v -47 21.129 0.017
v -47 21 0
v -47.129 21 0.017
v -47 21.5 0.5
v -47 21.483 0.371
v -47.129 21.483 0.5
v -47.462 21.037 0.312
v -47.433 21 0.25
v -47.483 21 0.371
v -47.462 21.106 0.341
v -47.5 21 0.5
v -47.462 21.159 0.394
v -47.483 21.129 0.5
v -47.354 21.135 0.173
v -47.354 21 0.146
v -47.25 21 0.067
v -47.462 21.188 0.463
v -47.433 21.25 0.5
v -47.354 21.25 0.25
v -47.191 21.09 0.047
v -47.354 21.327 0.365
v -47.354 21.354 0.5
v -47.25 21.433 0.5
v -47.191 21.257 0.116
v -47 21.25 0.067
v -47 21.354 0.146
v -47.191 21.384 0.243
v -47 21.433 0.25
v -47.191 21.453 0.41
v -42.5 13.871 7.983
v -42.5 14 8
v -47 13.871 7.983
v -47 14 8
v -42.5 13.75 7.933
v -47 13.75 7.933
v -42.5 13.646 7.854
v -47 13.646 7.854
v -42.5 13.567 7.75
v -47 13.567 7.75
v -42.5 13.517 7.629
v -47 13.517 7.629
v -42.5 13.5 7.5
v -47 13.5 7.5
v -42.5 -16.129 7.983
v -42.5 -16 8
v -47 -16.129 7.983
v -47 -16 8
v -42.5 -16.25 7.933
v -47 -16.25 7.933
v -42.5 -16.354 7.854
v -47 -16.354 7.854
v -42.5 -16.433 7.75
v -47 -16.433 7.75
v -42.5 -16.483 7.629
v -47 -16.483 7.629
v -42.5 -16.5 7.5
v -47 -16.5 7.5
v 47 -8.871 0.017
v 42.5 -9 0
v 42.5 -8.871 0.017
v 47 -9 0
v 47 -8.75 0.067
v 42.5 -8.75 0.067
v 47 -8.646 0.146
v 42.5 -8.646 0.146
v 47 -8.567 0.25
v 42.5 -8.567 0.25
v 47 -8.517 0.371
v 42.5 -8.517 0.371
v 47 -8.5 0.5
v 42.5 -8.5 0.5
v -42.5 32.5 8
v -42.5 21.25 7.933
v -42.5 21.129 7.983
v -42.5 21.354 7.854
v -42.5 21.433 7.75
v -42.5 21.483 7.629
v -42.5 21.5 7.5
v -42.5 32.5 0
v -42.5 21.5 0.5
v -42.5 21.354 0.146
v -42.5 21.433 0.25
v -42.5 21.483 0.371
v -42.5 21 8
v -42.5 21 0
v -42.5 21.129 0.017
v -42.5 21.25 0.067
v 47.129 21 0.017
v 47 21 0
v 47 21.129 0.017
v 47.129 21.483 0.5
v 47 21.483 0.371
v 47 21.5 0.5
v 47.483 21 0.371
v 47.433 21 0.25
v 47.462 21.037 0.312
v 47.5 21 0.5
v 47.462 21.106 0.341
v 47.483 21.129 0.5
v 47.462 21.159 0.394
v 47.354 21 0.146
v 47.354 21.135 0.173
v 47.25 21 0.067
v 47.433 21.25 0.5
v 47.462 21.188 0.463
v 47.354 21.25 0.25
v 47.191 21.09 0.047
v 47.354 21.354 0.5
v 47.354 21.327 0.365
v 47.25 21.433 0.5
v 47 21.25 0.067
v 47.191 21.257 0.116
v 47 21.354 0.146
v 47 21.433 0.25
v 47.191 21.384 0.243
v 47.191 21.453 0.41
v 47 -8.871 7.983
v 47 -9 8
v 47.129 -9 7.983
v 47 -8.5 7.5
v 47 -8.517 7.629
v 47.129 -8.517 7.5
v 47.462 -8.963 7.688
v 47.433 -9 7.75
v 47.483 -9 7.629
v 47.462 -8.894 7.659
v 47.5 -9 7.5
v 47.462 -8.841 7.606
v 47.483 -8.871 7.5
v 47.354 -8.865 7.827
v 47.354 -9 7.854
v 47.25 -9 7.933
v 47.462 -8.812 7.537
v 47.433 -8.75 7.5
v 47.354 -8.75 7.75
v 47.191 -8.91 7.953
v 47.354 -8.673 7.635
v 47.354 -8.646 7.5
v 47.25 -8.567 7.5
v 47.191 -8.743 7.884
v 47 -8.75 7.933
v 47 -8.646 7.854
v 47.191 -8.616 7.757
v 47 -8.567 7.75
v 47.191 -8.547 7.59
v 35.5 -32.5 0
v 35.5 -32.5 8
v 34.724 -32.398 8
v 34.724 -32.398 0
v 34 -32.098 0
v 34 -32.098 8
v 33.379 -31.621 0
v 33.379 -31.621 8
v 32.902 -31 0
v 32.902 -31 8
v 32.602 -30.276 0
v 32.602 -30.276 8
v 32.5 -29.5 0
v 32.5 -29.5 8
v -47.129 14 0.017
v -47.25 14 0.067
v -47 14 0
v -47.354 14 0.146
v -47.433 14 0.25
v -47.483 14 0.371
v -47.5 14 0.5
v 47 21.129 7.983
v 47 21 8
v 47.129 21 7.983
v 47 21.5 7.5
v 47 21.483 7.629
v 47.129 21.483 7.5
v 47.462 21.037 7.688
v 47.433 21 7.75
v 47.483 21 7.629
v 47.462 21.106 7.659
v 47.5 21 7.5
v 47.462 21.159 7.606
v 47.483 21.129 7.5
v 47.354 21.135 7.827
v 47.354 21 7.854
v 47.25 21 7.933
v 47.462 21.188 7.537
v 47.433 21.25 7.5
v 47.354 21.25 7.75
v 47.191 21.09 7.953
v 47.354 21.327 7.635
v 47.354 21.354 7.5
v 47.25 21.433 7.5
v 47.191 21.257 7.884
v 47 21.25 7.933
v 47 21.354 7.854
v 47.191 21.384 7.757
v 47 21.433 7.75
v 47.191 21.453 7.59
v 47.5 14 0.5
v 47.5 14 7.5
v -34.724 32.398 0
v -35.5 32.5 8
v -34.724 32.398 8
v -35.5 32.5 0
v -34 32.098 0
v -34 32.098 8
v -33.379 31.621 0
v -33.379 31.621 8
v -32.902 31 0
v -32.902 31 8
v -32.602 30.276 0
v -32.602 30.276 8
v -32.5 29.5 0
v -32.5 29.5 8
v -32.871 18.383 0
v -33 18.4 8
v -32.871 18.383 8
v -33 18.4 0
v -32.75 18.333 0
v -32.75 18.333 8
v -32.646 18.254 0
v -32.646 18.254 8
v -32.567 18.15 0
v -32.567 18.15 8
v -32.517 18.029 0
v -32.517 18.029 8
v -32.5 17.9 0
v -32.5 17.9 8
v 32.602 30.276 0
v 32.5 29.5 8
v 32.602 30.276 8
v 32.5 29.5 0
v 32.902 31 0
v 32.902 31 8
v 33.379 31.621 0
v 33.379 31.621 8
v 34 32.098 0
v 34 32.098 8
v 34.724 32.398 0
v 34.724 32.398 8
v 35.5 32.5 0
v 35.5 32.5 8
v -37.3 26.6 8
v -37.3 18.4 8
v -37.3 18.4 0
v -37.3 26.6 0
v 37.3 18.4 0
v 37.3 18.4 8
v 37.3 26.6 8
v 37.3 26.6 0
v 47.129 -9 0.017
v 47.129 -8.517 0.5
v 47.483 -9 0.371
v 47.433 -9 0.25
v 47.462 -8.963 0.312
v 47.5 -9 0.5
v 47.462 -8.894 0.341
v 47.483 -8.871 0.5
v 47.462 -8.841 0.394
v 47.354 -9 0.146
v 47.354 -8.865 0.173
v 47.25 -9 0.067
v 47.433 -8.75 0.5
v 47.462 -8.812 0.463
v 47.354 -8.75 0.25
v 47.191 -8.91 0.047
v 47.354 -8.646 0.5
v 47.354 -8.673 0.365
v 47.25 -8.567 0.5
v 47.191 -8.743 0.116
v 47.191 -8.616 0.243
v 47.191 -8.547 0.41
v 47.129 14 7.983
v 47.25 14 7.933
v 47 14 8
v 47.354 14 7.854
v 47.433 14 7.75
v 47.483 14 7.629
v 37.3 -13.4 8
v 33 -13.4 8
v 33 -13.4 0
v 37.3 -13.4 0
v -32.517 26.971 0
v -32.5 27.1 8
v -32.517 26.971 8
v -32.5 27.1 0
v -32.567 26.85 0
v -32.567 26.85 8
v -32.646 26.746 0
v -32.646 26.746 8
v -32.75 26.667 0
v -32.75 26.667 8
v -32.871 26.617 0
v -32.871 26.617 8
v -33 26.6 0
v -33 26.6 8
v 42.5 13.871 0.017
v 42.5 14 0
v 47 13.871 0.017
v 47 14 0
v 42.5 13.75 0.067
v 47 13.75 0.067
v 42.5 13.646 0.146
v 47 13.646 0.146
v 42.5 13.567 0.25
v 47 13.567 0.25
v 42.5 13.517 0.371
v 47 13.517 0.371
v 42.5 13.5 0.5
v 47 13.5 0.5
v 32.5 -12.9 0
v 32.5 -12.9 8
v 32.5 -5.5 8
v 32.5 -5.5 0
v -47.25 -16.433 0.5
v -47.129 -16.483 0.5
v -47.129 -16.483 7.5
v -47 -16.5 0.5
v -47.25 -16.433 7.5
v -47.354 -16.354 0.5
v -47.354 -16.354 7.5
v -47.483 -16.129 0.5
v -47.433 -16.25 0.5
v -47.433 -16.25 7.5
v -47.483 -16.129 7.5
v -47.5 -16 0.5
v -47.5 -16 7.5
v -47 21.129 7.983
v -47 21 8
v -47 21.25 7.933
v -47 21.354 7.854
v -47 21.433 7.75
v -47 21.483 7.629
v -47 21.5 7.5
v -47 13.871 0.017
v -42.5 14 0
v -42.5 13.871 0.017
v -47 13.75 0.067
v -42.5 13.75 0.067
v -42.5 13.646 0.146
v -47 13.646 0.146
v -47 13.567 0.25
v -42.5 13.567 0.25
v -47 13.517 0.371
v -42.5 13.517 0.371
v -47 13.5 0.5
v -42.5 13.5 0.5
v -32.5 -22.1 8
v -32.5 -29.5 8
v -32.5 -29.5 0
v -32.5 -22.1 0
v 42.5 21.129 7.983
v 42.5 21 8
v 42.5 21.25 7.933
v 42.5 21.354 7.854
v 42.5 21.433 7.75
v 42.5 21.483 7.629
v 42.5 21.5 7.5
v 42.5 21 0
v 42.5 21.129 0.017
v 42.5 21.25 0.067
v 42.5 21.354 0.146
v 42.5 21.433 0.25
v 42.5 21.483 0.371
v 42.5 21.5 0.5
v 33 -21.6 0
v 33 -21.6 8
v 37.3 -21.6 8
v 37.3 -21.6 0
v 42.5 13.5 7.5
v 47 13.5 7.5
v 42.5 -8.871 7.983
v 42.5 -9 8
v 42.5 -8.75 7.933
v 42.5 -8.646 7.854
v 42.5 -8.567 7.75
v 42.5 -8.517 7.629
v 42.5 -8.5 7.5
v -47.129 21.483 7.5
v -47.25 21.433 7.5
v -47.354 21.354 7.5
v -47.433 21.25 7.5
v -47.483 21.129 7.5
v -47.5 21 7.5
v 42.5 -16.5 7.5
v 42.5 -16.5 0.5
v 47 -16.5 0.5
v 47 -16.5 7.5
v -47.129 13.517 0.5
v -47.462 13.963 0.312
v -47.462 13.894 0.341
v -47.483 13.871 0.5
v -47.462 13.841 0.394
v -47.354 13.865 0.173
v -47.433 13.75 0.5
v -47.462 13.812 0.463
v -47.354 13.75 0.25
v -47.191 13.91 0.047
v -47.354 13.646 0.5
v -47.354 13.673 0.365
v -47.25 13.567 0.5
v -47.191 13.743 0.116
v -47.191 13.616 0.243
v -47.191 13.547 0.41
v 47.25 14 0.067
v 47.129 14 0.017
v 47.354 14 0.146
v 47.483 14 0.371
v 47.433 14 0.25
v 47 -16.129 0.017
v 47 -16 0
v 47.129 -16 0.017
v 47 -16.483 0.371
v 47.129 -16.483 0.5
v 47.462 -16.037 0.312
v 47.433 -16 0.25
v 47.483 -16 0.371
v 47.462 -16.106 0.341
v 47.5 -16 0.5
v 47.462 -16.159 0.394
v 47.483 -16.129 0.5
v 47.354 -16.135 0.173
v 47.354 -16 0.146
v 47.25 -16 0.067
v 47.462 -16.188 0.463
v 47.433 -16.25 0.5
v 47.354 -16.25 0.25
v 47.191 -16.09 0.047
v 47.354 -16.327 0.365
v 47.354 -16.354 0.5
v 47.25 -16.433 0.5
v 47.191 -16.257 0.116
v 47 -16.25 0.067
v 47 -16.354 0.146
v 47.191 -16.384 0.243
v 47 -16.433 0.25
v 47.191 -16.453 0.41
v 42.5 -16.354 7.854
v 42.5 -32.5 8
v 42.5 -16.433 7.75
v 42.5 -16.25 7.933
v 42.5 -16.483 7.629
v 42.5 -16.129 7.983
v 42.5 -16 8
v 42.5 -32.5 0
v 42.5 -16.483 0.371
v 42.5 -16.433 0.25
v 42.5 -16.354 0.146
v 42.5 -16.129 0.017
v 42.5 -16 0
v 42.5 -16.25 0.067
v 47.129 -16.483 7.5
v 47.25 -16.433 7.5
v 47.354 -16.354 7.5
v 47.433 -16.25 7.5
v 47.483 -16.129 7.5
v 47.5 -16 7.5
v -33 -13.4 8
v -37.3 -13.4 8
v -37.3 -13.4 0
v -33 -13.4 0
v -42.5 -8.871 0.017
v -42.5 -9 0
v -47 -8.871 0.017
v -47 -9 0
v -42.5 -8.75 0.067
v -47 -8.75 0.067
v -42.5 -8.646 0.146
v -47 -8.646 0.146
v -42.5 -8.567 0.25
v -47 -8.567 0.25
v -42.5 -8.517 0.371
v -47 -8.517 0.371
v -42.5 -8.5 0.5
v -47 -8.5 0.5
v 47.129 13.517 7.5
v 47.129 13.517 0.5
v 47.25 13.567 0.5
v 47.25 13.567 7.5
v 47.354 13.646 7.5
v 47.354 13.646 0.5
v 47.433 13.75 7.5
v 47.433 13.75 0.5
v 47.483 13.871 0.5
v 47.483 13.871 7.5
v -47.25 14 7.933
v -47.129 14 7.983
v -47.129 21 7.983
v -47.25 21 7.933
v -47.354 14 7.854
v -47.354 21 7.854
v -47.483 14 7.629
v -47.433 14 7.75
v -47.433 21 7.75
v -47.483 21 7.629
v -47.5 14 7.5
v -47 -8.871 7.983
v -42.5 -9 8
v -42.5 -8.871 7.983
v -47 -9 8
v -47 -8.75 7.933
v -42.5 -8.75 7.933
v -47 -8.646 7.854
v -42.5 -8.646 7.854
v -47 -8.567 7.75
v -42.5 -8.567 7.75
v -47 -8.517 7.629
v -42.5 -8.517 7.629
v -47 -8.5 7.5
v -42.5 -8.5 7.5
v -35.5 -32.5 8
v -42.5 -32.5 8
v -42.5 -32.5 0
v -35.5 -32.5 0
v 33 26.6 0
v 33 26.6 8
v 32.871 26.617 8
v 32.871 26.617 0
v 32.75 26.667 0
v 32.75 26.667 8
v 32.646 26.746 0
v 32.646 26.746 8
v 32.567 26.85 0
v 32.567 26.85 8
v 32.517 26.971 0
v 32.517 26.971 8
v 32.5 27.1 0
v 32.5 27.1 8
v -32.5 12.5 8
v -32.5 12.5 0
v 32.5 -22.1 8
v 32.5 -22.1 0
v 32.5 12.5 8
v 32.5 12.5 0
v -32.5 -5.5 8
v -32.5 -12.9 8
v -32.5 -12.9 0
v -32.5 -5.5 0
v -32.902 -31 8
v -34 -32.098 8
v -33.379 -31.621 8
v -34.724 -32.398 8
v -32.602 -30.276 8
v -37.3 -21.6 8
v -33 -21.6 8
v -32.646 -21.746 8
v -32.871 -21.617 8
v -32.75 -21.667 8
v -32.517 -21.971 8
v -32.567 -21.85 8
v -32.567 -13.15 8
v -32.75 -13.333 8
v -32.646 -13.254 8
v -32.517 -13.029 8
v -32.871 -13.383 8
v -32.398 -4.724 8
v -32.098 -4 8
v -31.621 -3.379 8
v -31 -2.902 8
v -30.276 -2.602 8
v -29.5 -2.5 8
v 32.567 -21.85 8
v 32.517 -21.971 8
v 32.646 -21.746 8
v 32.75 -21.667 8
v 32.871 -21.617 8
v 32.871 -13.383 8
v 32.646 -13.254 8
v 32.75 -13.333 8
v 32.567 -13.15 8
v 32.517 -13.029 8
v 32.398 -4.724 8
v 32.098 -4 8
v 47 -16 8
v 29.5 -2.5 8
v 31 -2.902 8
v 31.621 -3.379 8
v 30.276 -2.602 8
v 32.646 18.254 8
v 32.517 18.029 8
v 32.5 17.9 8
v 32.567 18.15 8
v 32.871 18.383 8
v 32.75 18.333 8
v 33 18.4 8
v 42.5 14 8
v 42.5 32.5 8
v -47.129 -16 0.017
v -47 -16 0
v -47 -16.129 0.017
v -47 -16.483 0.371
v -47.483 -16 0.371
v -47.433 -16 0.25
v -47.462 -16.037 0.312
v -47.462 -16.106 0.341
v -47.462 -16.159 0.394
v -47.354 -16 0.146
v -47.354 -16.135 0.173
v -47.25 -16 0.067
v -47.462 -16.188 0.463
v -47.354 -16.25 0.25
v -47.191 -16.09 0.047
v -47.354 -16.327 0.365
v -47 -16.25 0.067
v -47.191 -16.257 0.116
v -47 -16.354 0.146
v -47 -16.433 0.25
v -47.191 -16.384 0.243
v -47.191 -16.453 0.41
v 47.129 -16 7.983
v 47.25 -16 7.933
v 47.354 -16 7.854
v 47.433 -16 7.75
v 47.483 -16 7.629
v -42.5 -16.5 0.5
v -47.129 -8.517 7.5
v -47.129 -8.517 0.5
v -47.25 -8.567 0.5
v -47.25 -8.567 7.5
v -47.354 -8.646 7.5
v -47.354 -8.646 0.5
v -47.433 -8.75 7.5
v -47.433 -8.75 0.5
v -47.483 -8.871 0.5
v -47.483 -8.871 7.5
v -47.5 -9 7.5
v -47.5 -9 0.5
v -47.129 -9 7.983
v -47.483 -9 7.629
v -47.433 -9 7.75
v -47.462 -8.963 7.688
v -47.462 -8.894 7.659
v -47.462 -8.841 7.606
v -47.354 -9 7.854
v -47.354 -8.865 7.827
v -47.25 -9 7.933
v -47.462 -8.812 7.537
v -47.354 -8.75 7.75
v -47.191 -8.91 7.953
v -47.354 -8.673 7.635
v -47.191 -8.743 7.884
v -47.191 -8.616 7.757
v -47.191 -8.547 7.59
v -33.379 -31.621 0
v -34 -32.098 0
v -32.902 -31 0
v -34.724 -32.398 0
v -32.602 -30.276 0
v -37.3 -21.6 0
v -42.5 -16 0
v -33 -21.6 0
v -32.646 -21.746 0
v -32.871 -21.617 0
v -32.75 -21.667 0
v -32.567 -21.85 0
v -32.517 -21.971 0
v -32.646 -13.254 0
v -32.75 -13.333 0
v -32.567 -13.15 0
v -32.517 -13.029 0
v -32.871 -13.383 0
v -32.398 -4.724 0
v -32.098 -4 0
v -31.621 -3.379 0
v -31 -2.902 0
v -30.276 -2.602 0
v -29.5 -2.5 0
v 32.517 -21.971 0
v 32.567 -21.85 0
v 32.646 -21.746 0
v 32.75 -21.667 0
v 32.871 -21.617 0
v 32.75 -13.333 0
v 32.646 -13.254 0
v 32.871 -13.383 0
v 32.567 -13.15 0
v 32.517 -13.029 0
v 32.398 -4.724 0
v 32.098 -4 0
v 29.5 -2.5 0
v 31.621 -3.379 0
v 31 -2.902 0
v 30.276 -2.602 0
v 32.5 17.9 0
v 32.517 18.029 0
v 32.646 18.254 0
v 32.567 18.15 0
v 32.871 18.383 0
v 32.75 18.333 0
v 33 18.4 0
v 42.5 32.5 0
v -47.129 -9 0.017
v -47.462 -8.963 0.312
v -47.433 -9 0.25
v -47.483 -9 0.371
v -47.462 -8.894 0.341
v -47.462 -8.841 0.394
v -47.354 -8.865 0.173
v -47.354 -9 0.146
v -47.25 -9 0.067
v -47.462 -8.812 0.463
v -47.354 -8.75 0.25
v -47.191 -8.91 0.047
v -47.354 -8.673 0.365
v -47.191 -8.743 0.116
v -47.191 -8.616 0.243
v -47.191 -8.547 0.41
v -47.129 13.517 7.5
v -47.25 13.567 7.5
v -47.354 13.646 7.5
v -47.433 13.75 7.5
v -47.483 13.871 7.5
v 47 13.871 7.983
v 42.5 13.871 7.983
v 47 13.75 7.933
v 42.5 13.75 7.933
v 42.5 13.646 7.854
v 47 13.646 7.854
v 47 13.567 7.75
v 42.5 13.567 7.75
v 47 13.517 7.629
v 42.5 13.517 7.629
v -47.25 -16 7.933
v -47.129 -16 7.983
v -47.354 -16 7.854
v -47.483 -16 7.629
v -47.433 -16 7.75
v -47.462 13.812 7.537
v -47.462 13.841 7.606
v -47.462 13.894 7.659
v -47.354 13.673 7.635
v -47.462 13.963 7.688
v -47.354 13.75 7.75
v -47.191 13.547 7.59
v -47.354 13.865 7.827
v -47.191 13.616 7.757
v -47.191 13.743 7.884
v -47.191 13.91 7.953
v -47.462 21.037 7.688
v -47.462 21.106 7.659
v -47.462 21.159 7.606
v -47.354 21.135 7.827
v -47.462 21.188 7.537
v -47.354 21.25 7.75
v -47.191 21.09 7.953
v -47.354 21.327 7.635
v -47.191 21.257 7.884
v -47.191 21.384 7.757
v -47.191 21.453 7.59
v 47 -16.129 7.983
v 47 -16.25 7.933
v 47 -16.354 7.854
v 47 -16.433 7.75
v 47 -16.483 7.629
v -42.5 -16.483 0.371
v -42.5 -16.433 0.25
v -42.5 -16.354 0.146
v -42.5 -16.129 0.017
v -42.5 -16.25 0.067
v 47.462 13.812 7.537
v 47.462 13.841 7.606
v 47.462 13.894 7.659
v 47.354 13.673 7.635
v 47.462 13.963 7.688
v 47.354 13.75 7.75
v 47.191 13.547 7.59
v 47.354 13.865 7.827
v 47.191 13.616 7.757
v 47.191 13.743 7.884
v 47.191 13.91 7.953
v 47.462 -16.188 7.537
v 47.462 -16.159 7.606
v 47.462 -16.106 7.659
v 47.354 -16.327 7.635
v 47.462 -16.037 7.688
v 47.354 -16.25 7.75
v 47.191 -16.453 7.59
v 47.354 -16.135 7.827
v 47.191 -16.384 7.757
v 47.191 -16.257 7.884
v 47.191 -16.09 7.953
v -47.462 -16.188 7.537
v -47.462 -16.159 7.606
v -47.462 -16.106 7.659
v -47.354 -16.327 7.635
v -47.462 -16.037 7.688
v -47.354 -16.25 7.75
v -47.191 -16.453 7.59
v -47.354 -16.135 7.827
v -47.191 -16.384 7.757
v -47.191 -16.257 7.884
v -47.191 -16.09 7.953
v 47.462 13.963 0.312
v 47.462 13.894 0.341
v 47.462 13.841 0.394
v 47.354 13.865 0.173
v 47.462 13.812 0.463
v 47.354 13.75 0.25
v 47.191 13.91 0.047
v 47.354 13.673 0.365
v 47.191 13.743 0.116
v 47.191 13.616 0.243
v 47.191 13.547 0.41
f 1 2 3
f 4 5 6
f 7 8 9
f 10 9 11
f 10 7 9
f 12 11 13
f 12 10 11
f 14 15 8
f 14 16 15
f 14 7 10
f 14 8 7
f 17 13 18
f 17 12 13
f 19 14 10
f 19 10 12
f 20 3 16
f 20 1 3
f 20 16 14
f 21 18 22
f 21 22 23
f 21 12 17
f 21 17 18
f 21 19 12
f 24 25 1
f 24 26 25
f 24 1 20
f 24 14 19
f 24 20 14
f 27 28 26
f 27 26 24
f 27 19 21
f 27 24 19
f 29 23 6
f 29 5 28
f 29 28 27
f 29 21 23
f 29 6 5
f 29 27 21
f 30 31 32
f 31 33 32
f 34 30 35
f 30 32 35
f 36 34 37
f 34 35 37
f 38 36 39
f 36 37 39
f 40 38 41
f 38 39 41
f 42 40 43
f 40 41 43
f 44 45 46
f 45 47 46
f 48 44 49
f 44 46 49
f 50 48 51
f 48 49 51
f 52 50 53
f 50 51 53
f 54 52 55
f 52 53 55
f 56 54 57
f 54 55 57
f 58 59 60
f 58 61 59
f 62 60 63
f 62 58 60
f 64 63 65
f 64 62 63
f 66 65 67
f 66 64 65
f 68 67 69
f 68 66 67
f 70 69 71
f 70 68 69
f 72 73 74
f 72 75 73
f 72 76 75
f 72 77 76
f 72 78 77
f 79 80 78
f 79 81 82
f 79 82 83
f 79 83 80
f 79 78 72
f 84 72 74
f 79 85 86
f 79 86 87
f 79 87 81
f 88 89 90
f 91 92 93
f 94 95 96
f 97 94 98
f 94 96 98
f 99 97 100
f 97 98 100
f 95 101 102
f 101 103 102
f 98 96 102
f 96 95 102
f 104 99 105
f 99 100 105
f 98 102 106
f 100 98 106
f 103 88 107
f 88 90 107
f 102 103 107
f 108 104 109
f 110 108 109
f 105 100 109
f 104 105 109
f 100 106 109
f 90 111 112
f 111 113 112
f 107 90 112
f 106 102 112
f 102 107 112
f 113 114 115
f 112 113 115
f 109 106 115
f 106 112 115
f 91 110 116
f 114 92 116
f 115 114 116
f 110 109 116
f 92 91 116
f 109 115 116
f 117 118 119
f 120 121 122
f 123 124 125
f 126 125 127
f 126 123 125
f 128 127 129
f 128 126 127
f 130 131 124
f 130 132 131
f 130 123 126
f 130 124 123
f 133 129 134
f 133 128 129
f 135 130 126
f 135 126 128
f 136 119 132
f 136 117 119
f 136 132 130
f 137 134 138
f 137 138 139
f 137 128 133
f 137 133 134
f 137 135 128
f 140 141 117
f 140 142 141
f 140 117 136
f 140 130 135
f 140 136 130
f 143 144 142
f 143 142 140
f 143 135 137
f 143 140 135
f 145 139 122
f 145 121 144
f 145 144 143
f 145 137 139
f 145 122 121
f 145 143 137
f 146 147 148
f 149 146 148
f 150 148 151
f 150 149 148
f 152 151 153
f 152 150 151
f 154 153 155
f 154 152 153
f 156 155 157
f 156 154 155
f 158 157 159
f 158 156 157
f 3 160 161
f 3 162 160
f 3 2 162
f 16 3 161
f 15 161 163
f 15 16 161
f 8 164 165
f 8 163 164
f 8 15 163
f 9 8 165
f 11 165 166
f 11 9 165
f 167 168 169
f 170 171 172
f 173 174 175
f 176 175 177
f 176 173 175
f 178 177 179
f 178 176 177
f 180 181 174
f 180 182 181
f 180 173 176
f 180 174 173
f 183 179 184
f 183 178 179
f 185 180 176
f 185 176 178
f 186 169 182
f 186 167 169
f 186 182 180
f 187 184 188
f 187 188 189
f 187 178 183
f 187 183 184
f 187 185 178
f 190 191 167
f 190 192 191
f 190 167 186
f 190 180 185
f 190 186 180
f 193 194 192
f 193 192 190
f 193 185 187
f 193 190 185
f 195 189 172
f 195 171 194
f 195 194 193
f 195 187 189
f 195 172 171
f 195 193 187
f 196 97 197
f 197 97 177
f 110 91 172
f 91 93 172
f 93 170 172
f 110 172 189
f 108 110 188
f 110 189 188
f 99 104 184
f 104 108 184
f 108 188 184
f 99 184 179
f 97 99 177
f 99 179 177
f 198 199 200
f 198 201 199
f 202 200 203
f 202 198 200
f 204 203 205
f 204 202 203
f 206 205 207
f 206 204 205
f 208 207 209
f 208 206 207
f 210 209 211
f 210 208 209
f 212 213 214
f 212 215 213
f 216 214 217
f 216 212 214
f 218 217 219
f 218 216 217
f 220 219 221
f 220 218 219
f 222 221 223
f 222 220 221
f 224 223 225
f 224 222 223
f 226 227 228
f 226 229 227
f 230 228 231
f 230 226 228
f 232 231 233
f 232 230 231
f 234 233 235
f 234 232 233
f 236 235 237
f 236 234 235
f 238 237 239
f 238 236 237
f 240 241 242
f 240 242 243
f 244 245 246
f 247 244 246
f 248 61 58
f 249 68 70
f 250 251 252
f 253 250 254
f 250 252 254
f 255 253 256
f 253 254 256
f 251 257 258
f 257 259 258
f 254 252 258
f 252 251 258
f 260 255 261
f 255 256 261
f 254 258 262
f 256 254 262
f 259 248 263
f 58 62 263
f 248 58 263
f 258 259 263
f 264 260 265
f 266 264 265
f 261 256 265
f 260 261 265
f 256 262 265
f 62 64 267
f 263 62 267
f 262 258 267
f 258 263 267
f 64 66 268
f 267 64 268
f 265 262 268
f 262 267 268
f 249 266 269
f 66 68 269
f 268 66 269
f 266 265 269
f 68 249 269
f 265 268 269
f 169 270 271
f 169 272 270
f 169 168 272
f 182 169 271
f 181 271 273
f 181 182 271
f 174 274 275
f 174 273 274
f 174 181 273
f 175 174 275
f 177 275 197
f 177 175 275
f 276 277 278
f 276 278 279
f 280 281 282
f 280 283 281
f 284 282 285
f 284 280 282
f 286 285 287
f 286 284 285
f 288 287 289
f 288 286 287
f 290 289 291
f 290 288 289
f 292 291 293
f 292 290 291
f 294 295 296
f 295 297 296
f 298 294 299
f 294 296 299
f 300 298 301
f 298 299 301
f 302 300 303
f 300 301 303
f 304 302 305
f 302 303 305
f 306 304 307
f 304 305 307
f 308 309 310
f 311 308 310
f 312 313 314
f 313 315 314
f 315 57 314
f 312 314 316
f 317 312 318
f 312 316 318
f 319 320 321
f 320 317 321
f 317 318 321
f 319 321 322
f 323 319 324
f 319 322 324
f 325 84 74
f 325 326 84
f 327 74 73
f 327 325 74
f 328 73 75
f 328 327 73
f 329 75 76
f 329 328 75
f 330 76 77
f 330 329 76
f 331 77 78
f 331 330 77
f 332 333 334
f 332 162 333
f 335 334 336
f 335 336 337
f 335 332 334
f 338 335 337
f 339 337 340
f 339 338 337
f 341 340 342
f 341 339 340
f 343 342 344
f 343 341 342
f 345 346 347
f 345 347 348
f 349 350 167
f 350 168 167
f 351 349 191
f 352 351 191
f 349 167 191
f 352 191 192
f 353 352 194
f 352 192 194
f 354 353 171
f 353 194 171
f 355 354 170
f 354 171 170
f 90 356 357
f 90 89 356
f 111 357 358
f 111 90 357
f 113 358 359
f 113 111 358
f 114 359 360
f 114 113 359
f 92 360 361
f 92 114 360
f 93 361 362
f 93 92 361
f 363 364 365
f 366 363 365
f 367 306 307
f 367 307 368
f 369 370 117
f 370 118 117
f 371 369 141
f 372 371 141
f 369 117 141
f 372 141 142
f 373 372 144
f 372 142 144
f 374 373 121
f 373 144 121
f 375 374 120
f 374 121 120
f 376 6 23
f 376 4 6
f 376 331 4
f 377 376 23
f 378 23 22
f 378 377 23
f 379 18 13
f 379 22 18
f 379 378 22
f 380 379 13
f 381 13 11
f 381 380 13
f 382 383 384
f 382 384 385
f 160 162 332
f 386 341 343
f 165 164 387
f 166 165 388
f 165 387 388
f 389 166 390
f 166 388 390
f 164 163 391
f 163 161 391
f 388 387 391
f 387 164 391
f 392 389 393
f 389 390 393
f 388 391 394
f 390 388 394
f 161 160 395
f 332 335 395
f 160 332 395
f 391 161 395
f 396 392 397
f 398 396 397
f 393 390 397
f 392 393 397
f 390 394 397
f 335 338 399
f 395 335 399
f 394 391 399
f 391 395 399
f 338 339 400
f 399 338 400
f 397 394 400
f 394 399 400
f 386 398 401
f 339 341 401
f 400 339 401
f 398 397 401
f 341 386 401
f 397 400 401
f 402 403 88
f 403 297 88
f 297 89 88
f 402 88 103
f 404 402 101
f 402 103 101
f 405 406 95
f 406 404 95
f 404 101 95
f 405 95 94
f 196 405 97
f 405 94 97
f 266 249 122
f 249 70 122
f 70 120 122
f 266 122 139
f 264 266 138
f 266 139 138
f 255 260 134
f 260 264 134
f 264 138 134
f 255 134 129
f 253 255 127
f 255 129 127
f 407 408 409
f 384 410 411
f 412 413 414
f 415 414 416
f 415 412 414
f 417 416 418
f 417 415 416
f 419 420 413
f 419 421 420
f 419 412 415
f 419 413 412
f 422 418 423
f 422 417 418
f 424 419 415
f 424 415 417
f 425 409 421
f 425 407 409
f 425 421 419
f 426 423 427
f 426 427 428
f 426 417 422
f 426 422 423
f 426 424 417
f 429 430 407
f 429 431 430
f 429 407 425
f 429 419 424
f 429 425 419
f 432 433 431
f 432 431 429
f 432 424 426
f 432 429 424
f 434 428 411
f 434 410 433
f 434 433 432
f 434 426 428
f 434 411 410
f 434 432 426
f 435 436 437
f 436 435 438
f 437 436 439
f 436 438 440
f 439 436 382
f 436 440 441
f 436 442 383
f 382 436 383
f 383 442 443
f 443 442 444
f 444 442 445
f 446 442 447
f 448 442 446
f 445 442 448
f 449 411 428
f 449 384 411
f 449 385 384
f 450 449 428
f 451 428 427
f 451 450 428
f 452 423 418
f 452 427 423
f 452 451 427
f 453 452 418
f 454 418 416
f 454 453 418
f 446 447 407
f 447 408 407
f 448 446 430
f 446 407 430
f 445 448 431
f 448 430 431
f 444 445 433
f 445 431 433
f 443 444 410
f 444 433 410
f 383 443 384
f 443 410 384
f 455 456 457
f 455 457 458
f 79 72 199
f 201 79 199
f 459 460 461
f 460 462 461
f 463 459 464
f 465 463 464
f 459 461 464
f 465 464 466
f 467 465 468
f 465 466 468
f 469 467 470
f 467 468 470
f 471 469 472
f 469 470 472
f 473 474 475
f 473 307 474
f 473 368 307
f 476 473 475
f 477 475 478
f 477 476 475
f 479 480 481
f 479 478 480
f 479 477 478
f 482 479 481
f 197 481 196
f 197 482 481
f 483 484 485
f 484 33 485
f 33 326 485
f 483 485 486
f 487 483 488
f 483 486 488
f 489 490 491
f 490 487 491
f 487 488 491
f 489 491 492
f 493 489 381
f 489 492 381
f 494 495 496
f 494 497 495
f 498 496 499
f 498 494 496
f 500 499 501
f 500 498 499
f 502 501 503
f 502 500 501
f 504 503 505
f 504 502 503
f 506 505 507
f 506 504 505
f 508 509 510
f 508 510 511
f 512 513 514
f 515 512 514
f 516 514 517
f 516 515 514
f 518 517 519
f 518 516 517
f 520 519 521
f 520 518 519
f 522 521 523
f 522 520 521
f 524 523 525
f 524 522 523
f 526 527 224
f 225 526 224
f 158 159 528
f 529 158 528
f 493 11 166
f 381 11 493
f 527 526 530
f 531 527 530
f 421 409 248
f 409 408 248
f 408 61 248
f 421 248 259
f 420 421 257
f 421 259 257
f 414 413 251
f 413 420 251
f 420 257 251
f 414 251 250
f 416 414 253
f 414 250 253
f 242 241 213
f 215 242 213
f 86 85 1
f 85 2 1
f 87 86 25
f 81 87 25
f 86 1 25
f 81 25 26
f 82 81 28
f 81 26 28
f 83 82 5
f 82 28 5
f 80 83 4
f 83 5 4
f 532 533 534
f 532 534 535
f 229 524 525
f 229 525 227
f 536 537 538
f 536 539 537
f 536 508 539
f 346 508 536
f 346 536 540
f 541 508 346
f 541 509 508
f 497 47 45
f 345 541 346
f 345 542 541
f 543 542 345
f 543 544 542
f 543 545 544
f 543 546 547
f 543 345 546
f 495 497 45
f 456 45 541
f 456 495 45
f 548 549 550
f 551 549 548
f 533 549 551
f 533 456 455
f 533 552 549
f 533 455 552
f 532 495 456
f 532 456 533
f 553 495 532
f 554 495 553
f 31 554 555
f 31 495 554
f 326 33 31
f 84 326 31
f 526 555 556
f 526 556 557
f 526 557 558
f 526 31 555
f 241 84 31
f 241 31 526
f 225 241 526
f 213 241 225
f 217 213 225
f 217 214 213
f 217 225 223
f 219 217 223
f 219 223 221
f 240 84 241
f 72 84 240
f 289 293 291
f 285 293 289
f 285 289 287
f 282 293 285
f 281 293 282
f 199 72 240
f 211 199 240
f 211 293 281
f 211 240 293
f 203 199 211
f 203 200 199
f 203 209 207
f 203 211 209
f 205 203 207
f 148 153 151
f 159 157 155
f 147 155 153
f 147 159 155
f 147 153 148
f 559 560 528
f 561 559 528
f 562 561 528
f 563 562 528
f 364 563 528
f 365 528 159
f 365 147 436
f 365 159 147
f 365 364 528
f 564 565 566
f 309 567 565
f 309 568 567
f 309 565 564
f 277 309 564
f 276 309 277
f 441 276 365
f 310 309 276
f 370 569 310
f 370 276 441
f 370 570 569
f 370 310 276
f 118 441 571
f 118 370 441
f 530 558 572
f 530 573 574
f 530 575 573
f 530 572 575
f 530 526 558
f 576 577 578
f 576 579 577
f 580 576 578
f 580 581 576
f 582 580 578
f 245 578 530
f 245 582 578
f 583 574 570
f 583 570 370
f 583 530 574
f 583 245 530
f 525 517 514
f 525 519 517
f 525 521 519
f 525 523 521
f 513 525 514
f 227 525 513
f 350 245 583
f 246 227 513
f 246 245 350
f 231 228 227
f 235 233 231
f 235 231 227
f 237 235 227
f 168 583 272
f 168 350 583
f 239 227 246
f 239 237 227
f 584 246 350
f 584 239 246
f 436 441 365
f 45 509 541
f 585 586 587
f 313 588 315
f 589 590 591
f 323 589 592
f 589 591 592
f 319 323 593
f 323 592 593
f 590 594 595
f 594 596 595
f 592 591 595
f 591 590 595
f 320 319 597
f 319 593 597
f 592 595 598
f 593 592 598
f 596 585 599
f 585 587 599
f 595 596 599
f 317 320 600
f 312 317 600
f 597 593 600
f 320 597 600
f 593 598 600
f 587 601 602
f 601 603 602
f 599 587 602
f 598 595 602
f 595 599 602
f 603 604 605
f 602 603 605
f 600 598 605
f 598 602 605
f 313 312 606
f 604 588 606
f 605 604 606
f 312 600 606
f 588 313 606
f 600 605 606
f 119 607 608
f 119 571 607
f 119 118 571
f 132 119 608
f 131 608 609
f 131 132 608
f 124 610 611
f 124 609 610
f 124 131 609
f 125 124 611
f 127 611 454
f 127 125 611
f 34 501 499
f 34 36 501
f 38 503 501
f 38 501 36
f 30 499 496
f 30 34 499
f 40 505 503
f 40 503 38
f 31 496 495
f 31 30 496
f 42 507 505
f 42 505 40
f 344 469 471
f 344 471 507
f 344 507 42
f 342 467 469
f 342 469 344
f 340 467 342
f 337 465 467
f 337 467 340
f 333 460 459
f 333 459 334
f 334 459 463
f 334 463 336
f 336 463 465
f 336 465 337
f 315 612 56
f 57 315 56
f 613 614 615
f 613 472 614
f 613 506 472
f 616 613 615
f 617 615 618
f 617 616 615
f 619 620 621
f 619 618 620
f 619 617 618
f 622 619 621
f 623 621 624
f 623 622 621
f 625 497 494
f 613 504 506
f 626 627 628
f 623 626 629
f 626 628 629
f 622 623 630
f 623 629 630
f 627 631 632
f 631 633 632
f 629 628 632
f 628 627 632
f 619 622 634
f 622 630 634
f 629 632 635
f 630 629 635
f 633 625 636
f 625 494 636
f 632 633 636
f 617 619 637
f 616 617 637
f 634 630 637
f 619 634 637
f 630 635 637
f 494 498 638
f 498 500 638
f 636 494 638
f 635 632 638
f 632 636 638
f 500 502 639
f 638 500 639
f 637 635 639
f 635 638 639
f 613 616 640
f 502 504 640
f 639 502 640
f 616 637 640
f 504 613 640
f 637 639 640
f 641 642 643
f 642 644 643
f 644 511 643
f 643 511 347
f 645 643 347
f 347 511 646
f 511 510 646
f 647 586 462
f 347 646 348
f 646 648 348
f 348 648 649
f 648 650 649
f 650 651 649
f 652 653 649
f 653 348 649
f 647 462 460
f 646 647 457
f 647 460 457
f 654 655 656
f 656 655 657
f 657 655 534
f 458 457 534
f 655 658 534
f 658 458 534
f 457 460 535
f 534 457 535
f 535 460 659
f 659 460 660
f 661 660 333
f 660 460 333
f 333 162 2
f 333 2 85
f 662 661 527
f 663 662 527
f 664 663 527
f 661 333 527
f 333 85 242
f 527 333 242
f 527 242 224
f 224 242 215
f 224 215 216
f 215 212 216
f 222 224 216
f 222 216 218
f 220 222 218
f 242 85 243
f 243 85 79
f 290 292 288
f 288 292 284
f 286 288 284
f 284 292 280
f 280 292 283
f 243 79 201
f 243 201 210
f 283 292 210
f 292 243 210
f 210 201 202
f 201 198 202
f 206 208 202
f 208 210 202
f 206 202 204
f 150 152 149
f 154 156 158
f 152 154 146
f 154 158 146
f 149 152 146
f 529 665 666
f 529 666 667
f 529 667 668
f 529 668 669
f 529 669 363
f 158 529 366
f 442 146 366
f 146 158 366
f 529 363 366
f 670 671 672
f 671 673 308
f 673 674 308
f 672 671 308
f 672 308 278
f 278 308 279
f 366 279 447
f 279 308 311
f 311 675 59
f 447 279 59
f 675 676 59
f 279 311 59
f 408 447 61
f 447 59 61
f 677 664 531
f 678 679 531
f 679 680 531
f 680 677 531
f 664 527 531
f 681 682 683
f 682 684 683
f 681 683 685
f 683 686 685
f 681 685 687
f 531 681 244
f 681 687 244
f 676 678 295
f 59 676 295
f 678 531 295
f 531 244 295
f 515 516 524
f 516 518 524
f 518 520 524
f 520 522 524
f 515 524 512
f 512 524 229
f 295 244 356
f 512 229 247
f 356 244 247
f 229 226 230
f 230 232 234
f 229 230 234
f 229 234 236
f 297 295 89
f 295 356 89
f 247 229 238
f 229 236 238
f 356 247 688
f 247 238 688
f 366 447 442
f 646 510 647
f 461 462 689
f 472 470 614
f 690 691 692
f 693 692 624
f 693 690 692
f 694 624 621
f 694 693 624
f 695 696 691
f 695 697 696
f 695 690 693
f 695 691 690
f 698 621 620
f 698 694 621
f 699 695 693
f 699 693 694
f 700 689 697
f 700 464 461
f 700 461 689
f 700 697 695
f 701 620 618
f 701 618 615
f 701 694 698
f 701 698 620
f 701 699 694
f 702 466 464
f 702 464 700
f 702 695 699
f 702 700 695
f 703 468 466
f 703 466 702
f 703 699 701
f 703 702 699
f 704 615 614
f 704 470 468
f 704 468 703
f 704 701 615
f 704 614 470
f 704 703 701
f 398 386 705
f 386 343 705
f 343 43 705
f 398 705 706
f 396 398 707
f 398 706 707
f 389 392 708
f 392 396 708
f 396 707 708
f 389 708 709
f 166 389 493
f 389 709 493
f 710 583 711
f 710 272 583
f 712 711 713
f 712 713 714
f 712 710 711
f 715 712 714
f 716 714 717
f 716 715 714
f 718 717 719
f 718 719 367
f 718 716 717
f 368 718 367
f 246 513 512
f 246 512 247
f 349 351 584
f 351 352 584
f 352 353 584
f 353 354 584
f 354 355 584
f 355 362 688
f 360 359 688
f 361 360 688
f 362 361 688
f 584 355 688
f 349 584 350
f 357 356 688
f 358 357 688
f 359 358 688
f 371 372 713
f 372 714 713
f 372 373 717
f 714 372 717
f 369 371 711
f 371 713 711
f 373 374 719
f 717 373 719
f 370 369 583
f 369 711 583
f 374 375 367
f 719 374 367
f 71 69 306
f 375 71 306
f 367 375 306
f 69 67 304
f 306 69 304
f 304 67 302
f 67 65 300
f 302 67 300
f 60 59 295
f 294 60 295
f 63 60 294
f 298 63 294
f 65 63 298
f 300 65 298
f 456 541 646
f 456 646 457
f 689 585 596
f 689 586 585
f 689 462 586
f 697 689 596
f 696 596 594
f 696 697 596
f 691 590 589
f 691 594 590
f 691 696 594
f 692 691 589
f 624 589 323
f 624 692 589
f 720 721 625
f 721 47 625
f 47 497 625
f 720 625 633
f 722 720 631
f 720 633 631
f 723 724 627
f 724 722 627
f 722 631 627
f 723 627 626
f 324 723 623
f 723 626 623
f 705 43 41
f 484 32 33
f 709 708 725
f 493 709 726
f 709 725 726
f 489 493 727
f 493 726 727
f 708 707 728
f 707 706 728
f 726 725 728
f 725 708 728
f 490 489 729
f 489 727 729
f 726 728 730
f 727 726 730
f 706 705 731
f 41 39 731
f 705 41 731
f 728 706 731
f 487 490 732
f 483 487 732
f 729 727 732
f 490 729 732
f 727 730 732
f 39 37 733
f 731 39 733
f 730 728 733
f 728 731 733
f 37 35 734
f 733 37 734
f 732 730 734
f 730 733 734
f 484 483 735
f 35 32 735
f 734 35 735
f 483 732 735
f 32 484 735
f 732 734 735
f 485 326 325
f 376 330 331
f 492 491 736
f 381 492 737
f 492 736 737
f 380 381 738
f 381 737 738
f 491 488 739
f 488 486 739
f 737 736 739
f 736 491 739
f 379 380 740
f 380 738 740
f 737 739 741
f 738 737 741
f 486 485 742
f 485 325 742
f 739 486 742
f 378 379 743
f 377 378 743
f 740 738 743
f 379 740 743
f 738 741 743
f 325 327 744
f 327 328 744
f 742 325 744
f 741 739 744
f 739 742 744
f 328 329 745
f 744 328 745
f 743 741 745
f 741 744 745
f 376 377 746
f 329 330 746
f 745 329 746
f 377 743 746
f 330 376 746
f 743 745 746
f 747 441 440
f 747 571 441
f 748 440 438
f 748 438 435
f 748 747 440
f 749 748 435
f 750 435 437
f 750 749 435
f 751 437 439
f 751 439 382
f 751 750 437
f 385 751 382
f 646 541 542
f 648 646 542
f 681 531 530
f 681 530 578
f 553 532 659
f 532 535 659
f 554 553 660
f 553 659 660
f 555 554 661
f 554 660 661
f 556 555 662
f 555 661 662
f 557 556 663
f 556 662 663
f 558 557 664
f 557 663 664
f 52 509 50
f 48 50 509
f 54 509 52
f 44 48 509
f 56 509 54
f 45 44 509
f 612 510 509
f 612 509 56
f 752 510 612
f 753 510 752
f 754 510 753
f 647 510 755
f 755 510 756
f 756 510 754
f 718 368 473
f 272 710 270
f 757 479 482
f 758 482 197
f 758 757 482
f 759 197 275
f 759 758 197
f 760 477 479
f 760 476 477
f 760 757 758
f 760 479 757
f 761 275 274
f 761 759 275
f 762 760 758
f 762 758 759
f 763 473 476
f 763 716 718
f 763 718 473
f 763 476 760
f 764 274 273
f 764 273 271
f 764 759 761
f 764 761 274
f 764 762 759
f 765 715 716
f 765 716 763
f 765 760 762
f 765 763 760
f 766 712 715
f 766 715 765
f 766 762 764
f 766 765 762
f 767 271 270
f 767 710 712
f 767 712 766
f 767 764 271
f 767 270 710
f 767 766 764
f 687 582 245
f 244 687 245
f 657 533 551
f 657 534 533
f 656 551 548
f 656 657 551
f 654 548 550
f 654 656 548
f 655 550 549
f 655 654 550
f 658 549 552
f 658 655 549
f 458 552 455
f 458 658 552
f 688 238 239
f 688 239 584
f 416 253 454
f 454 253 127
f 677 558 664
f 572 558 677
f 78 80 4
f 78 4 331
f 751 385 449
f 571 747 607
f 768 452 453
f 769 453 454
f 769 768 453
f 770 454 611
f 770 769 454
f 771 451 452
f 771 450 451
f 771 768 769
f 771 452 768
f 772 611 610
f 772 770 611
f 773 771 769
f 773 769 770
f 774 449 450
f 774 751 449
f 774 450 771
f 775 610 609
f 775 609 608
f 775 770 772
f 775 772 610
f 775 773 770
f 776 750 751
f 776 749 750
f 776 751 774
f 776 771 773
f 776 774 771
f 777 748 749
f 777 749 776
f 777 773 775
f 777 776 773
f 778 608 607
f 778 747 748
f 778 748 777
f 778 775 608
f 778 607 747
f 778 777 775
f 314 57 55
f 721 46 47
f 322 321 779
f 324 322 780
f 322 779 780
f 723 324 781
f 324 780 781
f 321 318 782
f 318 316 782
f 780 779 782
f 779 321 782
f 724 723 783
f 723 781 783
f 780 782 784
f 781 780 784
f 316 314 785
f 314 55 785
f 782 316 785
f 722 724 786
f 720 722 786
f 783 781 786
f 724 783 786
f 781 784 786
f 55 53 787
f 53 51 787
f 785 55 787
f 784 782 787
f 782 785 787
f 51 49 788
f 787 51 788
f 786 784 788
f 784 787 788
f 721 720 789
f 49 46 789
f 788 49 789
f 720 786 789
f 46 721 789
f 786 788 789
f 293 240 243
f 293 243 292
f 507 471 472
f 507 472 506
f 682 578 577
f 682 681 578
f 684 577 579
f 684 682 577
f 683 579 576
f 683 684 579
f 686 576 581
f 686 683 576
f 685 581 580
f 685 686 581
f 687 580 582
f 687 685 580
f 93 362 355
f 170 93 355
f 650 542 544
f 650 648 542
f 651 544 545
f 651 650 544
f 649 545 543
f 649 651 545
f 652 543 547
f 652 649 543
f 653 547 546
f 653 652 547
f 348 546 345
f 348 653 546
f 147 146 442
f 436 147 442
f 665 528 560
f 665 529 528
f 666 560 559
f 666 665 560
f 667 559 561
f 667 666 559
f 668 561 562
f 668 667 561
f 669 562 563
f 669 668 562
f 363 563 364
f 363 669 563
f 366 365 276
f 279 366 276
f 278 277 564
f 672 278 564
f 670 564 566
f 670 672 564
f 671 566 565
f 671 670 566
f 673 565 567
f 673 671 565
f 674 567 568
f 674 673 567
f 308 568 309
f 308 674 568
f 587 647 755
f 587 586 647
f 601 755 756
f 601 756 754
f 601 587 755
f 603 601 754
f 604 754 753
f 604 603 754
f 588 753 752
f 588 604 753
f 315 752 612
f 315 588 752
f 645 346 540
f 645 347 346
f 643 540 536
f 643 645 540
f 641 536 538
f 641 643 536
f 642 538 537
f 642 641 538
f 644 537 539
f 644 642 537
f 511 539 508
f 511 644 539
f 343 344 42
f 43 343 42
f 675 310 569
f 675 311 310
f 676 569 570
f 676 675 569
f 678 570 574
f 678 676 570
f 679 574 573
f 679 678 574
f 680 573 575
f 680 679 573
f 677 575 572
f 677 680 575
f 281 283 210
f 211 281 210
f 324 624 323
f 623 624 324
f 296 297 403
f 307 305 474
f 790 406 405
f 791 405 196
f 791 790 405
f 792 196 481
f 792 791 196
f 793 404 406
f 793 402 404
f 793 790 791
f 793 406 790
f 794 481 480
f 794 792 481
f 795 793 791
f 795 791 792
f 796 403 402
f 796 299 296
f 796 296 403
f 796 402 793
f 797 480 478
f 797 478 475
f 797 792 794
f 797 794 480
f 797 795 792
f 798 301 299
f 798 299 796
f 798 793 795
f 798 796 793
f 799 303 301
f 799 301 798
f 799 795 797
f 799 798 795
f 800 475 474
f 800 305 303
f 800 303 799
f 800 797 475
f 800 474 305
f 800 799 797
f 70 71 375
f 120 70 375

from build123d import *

# Parameters (mm, degrees)
CROQUIS1_W               = 85
CROQUIS1_H               = 65
SALIENTE_EXTRUIR1_DEPTH  = 8
CROQUIS2_W               = 65
CROQUIS2_H               = 20
CORTAR_EXTRUIR1_DEPTH    = 8
CROQUIS3_W               = 65
CROQUIS3_H               = 30
CORTAR_EXTRUIR2_DEPTH    = 8
REDONDEO1_R              = 3
CROQUIS4_W               = 8
CROQUIS4_H               = 8
SALIENTE_EXTRUIR2_DEPTH  = 5
REDONDEO2_R              = 0.5
REDONDEO2_OF_SIMETR_A1_R = 0.5
REDONDEO3_R              = 3
CROQUIS5_W               = 4.8
CROQUIS5_H               = 8.2
CORTAR_EXTRUIR3_DEPTH    = 59.107658703
REDONDEO4_R              = 0.5


with BuildPart() as part:
    # Croquis1 → Saliente-Extruir1 (new body)
    with BuildSketch(Plane.XY):
        Rectangle(CROQUIS1_W, CROQUIS1_H)
    extrude(amount=SALIENTE_EXTRUIR1_DEPTH)

    # Croquis2 → Cortar-Extruir1 (cut)
    with BuildSketch(Plane.XY.offset(8)):
        with Locations((0, 22.5)):
            Rectangle(CROQUIS2_W, CROQUIS2_H)
    extrude(amount=-CORTAR_EXTRUIR1_DEPTH, mode=Mode.SUBTRACT)

    # Croquis3 → Cortar-Extruir2 (cut)
    with BuildSketch(Plane.XY.offset(8)):
        with Locations((0, -17.5)):
            Rectangle(CROQUIS3_W, CROQUIS3_H)
    extrude(amount=-CORTAR_EXTRUIR2_DEPTH, mode=Mode.SUBTRACT)

    # Redondeo1
    redondeo1_edges = [part.edges().sort_by_distance(p)[0] for p in [
        (-32.5, -2.5, 4),
        (32.5, -2.5, 4),
    ]]
    fillet(redondeo1_edges, radius=REDONDEO1_R)

    # Croquis4 → Saliente-Extruir2 (add)
    with BuildSketch(Plane.ZY.offset(42.5)):
        with Locations((4, -12.5)):
            Rectangle(CROQUIS4_W, CROQUIS4_H)
        with Locations((4, 17.5)):
            Rectangle(CROQUIS4_W, CROQUIS4_H)
    saliente_extruir2 = extrude(amount=SALIENTE_EXTRUIR2_DEPTH)

    # Redondeo2
    redondeo2_edges = [part.edges().sort_by_distance(p)[0] for p in [
        (-45, -8.5, 0),
        (-45, -16.5, 0),
        (-45, -16.5, 8),
        (-45, -8.5, 8),
        (-47.5, -12.5, 0),
        (-47.5, -16.5, 4),
        (-47.5, -12.5, 8),
        (-47.5, -8.5, 4),
        (-45, 21.5, 0),
        (-45, 13.5, 0),
        (-45, 13.5, 8),
        (-45, 21.5, 8),
        (-47.5, 17.5, 0),
        (-47.5, 13.5, 4),
        (-47.5, 17.5, 8),
        (-47.5, 21.5, 4),
    ]]
    fillet(redondeo2_edges, radius=REDONDEO2_R)

    # Simetría1: Saliente-Extruir2 across plane
    add(saliente_extruir2.mirror(Plane(origin=(0, 0, 0), x_dir=(0, 0, 1), z_dir=(1, 0, 0))))

    # Redondeo2 of Simetría1
    redondeo2_of_simetr_a1_edges = [part.edges().sort_by_distance(p)[0] for p in [
        (45, -8.5, 0),
        (45, -16.5, 0),
        (45, -16.5, 8),
        (45, -8.5, 8),
        (47.5, -12.5, 0),
        (47.5, -16.5, 4),
        (47.5, -12.5, 8),
        (47.5, -8.5, 4),
        (45, 21.5, 0),
        (45, 13.5, 0),
        (45, 13.5, 8),
        (45, 21.5, 8),
        (47.5, 17.5, 0),
        (47.5, 13.5, 4),
        (47.5, 17.5, 8),
        (47.5, 21.5, 4),
    ]]
    fillet(redondeo2_of_simetr_a1_edges, radius=REDONDEO2_OF_SIMETR_A1_R)

    # Redondeo3
    redondeo3_edges = [part.edges().sort_by_distance(p)[0] for p in [
        (-32.5, 32.5, 4),
        (32.5, 32.5, 4),
        (-32.5, -32.5, 4),
        (32.5, -32.5, 4),
    ]]
    fillet(redondeo3_edges, radius=REDONDEO3_R)

    # Croquis5 → Cortar-Extruir3 (cut, through all)
    with BuildSketch(Plane.XY.offset(8)):
        with Locations((-34.9, 22.5)):
            Rectangle(CROQUIS5_W, CROQUIS5_H)
        with Locations((-34.9, -17.5)):
            Rectangle(CROQUIS5_W, CROQUIS5_H)
        with Locations((34.9, -17.5)):
            Rectangle(CROQUIS5_W, CROQUIS5_H)
        with Locations((34.9, 22.5)):
            Rectangle(CROQUIS5_W, CROQUIS5_H)
    extrude(amount=-CORTAR_EXTRUIR3_DEPTH, mode=Mode.SUBTRACT)

    # Redondeo4
    redondeo4_edges = [part.edges().sort_by_distance(p)[0] for p in [
        (32.5, 26.6, 4),
        (32.5, 18.4, 4),
        (32.5, -13.4, 4),
        (32.5, -21.6, 4),
        (-32.5, -13.4, 4),
        (-32.5, -21.6, 4),
        (-32.5, 26.6, 4),
        (-32.5, 18.4, 4),
    ]]
    fillet(redondeo4_edges, radius=REDONDEO4_R)


solid = part.part
